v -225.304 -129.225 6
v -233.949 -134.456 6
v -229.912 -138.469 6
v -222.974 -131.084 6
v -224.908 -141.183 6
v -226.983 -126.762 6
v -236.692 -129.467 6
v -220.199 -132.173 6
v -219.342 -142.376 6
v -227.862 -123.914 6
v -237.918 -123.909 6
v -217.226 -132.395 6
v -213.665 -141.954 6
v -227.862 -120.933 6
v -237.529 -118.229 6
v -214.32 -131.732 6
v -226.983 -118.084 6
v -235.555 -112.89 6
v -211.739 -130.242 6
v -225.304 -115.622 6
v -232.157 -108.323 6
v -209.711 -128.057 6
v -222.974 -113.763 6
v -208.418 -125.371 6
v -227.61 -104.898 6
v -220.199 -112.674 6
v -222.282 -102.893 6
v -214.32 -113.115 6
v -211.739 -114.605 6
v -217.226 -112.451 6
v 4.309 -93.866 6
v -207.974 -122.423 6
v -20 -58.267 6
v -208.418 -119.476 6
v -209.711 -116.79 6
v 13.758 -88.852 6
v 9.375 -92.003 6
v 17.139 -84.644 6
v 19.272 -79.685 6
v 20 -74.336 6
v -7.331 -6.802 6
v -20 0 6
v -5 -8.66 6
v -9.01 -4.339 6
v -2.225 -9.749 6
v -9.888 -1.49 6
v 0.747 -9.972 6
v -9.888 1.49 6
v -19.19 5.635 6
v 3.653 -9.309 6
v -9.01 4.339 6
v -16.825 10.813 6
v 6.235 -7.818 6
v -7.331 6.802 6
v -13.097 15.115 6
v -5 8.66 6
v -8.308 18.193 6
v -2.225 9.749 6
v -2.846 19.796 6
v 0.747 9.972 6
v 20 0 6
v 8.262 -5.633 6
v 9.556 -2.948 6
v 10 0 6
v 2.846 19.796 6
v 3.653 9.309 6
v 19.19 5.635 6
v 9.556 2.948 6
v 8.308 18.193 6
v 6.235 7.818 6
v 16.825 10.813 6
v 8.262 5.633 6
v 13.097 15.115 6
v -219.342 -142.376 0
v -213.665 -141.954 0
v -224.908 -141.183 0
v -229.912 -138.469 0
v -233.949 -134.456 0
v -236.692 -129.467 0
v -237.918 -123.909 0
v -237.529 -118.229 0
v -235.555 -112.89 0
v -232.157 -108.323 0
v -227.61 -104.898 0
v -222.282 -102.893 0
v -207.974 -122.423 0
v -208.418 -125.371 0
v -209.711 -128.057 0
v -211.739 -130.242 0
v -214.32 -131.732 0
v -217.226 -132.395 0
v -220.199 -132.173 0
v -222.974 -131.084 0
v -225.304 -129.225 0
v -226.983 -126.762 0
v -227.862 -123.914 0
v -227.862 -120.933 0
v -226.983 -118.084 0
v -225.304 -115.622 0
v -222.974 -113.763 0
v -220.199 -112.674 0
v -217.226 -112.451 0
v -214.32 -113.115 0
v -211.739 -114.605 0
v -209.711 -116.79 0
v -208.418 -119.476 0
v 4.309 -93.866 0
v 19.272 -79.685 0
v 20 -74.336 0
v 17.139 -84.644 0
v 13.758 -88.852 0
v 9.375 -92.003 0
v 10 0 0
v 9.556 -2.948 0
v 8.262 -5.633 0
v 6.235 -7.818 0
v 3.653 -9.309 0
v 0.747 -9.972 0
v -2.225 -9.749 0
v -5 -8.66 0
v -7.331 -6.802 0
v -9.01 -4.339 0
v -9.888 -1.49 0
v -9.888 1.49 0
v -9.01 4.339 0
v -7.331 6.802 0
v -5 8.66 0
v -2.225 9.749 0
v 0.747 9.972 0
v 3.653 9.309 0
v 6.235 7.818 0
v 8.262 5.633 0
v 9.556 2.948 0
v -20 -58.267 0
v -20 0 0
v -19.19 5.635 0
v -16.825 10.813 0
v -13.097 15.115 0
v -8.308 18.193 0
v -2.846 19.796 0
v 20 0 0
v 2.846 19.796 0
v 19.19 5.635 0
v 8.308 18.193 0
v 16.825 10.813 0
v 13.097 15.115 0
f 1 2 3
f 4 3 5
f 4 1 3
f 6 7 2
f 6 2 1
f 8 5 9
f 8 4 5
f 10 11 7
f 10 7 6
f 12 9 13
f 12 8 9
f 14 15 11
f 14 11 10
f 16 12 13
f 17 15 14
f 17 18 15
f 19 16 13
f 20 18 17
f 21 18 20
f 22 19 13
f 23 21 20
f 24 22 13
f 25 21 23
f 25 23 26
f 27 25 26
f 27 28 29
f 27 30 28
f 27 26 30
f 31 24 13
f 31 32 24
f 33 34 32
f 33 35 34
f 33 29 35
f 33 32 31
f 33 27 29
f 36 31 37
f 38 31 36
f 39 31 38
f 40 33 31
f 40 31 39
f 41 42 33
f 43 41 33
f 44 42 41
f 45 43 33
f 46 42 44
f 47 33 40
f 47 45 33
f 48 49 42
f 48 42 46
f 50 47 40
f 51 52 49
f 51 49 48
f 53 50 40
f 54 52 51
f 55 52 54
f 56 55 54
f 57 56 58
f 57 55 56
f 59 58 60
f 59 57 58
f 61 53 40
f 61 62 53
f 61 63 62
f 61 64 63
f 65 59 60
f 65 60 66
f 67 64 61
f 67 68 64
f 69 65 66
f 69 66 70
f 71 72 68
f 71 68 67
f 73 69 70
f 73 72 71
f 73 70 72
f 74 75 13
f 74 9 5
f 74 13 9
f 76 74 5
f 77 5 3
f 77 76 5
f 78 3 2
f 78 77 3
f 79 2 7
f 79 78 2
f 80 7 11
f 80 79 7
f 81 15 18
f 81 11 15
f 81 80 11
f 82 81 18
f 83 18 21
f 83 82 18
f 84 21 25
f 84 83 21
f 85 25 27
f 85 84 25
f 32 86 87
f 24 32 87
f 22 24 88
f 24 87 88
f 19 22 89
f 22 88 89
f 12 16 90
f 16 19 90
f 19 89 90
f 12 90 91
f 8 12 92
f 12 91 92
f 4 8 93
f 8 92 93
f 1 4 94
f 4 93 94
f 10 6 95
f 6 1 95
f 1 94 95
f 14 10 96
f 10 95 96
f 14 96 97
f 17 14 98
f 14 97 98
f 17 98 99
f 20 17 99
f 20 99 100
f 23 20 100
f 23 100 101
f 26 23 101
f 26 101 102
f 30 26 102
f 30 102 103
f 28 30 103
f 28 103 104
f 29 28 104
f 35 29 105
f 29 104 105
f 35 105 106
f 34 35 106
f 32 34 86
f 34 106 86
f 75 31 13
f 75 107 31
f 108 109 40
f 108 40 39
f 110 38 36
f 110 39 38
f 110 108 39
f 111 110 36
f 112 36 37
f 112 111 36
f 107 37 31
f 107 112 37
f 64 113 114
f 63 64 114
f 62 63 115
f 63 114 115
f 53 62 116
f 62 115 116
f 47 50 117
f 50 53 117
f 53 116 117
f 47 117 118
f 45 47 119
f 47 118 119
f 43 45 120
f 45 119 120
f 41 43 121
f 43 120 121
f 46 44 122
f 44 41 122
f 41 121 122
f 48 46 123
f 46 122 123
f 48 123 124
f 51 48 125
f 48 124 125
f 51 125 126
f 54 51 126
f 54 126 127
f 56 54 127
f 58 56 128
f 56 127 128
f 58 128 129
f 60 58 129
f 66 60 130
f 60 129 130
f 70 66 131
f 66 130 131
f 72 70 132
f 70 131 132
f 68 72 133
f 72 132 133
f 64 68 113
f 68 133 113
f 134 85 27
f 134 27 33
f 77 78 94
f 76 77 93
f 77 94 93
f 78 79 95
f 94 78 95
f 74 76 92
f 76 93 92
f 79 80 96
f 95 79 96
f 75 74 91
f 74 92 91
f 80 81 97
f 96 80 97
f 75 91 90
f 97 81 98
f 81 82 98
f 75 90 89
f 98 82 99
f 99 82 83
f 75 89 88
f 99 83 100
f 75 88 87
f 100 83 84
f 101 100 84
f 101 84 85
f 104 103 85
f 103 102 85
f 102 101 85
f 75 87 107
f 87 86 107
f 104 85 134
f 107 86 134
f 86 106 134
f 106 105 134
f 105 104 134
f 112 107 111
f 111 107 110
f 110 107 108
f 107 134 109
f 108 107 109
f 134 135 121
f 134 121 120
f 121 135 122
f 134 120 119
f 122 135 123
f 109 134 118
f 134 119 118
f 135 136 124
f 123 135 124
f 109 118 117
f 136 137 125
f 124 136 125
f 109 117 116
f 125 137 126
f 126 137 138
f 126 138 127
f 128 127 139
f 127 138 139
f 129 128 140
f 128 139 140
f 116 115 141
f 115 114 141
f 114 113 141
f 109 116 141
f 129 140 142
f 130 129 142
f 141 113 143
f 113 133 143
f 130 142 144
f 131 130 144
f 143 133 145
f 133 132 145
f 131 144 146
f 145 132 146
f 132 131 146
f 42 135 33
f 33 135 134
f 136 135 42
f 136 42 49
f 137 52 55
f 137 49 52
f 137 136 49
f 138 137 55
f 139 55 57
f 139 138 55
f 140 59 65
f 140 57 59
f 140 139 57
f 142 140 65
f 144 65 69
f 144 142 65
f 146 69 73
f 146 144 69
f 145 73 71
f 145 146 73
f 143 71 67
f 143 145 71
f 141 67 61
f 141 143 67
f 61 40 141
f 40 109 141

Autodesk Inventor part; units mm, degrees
ref_plane "YZ Plane" through (0, 0, 0) normal (1, 0, 0) x (0, 1, 0)
ref_plane "XZ Plane" through (0, 0, 0) normal (0, 1, 0) x (-1, 0, 0)
ref_plane "XY Plane" through (0, 0, 0) normal (0, 0, 1) x (1, 0, 0)
sketch "Sketch1" plane through (0, 0, 0) normal (0, 0, 1) x (1, 0, 0)
  circle A0 centre (0, 0) radius 10
  circle A1 centre (-217.9737, -122.4233) radius 10
  line L0 (0, 0) -> (0, -74.3359) construction
  line L1 (-20, 0) -> (-20, -74.3359)
  line L2 (20, -74.3359) -> (20, 0)
  arc A2 (20, 0) -> (-20, 0) centre (0, 0) ccw
  arc A3 (-20, -74.3359) -> (20, -74.3359) centre (0, -74.3359) ccw
  line L3 (0, -74.3359) -> (-217.9737, -122.4233) construction
  line L4 (4.3086, -93.8662) -> (-213.6651, -141.9536)
  line L5 (-222.2823, -102.8929) -> (-4.3086, -54.8055)
  arc A4 (4.3086, -93.8662) -> (-4.3086, -54.8055) centre (0, -74.3359) ccw
  arc A5 (-222.2823, -102.8929) -> (-213.6651, -141.9536) centre (-217.9737, -122.4233) ccw
  point P0 (0, -37.1679)
  point P1 (-108.9869, -98.3796)
  dimension "d1" = 20
  dimension "d6" = 40
extrude "Extrusion1" add sketch "Sketch1" along normal blind 6
properties part number "Barra estabilizadora de ascenso"
